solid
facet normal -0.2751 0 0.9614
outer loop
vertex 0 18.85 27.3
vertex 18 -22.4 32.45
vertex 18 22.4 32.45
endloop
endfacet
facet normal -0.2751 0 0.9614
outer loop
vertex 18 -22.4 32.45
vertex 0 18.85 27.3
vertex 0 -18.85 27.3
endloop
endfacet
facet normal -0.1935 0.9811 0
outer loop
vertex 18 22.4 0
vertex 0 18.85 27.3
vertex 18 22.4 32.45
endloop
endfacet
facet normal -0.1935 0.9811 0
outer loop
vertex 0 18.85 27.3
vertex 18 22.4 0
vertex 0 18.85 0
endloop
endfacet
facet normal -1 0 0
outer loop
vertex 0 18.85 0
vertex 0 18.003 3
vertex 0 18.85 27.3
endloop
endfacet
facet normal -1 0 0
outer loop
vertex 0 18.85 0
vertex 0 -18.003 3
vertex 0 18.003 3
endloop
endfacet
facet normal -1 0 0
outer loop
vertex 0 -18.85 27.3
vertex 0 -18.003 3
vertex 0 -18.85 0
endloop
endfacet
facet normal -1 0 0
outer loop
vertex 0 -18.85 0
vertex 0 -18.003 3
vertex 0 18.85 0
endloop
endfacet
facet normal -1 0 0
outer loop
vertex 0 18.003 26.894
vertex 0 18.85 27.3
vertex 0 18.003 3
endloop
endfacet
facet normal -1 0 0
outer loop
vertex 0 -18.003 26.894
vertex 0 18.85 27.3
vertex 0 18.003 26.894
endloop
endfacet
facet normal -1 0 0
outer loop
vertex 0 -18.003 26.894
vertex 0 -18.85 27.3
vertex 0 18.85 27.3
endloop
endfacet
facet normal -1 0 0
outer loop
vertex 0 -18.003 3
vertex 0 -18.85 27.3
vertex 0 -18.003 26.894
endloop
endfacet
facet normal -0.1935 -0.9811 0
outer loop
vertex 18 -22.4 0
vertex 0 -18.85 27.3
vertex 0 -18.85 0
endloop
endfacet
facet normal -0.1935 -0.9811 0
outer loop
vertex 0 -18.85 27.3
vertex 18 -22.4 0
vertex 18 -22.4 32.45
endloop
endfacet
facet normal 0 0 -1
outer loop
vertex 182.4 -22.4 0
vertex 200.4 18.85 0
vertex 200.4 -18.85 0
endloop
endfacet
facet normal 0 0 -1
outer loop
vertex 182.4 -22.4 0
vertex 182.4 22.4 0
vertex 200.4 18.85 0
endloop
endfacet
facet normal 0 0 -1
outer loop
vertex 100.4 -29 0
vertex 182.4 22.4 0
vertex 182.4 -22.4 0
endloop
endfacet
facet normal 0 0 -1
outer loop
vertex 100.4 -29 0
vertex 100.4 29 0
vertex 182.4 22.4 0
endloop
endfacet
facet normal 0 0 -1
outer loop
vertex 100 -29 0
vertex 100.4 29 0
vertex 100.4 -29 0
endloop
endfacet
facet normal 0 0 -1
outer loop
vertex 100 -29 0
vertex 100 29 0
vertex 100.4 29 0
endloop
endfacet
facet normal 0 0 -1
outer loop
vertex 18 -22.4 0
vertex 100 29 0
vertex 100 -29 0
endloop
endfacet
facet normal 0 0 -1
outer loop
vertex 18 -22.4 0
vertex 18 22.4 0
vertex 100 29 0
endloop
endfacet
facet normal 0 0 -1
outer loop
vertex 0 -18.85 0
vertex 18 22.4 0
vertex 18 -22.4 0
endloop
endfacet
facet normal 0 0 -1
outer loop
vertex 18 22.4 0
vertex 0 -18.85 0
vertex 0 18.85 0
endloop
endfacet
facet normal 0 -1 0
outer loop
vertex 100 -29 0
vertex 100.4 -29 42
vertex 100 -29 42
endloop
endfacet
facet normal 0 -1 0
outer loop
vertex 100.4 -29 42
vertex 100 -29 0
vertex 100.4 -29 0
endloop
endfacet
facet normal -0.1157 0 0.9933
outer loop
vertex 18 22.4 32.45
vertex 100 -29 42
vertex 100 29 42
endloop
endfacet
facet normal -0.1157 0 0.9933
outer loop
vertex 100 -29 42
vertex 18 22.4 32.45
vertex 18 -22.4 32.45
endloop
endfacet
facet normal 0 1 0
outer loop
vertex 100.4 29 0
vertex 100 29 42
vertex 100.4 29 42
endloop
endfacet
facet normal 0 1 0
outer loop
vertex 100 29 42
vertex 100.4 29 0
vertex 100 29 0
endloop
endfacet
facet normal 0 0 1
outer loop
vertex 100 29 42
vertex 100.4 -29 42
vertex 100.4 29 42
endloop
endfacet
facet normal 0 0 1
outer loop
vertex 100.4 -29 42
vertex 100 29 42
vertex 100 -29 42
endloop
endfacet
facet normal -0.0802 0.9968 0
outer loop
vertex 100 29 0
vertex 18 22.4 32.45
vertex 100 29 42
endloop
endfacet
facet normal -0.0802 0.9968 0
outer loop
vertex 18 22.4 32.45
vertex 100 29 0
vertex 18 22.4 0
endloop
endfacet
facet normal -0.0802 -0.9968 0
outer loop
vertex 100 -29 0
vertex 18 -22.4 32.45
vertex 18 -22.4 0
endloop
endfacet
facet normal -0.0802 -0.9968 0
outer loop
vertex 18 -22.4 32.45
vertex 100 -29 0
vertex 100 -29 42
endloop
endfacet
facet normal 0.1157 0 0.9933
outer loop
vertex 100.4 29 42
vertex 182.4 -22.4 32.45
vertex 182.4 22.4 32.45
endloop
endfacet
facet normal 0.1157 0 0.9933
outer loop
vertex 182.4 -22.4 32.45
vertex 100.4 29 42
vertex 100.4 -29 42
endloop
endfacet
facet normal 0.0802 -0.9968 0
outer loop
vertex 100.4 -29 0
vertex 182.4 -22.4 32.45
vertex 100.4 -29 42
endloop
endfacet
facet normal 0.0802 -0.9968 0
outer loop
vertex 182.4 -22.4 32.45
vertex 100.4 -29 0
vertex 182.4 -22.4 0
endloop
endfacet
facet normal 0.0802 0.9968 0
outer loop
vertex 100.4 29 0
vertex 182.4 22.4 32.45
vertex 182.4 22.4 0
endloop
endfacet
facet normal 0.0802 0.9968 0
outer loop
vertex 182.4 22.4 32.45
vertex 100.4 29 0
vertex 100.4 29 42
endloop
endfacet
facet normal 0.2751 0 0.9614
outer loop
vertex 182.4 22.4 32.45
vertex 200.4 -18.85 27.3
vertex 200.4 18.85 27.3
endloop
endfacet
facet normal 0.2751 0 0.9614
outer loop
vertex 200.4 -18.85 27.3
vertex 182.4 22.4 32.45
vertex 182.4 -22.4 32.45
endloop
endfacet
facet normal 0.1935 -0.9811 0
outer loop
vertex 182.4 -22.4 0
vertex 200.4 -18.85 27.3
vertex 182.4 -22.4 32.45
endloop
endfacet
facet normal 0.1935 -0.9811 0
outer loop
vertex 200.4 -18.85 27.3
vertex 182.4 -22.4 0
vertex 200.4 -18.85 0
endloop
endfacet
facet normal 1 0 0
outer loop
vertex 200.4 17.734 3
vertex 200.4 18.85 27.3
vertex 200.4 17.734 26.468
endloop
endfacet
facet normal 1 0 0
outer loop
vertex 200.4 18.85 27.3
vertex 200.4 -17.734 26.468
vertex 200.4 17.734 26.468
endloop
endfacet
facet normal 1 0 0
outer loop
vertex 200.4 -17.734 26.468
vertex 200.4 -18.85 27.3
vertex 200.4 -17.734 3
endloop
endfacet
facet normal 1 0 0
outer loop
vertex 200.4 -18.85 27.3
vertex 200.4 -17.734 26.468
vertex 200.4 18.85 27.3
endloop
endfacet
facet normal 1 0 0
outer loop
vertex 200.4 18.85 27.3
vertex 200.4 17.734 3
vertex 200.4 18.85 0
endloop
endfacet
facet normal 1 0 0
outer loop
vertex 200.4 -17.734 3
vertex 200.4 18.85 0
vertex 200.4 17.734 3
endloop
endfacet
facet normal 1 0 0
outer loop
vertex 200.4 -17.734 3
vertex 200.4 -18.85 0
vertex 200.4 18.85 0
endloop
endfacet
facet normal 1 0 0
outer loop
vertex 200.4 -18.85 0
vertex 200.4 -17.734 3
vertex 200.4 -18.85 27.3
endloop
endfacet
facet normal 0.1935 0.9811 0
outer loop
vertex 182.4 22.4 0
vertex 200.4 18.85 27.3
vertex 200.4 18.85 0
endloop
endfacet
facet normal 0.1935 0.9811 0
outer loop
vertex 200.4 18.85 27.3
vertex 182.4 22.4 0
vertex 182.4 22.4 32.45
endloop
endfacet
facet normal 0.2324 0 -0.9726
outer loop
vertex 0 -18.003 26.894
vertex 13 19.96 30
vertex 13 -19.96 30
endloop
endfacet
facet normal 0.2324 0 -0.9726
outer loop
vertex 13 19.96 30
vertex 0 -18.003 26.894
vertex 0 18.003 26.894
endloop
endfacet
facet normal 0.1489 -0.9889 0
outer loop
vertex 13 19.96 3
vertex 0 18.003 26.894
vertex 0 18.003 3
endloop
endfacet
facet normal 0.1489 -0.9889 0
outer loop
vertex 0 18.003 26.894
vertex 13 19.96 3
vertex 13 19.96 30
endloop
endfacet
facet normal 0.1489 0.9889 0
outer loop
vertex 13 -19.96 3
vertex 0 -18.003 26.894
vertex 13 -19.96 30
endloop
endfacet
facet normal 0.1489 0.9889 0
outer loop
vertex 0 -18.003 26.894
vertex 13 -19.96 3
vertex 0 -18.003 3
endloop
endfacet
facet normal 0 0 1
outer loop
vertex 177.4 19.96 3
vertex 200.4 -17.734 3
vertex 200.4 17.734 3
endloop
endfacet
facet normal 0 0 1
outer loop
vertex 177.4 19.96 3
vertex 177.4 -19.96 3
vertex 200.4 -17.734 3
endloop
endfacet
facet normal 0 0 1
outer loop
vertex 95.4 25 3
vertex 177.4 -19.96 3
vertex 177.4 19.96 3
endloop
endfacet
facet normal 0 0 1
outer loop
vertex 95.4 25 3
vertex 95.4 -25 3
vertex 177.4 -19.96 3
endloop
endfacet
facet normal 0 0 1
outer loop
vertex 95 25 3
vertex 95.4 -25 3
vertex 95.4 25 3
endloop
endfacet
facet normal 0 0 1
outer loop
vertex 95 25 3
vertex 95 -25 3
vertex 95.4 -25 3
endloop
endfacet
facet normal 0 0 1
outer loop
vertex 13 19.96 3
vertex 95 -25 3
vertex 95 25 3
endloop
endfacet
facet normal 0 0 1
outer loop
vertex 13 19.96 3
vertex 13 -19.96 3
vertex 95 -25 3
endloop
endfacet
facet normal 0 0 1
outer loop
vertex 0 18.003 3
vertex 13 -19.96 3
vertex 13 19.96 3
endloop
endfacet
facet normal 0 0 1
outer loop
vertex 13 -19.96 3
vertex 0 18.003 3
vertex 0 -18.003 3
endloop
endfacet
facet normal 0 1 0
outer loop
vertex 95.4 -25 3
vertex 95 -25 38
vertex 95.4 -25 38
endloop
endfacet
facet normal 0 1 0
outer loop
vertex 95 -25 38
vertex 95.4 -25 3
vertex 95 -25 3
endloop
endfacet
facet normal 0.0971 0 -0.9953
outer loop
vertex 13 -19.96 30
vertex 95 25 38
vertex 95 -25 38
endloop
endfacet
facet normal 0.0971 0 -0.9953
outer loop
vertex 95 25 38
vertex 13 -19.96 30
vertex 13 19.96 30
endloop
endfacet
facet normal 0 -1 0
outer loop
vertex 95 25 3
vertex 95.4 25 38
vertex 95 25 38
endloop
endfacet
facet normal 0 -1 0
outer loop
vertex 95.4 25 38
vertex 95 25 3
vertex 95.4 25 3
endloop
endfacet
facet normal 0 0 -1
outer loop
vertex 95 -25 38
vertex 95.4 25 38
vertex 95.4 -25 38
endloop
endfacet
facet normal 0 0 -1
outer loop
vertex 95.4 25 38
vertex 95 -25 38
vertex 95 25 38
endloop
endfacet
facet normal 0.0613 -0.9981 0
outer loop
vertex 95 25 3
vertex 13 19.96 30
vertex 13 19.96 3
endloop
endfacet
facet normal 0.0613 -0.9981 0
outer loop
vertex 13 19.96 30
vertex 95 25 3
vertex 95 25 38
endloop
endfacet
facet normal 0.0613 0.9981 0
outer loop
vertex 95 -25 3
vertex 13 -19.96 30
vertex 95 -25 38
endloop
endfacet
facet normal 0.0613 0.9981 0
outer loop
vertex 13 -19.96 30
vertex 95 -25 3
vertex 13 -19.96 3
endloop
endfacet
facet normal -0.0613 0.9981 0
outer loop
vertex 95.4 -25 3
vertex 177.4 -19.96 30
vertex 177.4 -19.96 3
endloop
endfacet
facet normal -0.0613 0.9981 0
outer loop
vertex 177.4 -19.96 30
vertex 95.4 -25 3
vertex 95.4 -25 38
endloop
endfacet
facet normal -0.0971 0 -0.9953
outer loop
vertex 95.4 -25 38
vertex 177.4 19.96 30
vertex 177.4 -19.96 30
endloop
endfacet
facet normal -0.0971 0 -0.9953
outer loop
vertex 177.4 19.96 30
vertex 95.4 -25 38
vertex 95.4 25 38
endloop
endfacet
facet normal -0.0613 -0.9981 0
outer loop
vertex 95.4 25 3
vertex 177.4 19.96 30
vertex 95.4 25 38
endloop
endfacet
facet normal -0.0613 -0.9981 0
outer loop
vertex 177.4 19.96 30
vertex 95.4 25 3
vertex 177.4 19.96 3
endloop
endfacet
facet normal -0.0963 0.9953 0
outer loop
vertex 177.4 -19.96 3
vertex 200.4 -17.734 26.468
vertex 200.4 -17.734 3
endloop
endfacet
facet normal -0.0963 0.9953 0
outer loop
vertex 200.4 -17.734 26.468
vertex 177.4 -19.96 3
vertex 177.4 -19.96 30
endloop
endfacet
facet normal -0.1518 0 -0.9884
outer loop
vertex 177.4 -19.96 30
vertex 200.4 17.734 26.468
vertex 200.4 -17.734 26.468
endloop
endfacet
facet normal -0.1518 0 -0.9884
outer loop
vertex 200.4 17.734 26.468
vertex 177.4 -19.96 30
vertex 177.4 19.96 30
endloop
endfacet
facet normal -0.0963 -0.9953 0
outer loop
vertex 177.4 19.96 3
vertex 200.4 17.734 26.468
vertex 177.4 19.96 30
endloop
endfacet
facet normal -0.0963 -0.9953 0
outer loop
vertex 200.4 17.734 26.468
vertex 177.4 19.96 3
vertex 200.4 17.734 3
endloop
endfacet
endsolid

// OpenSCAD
$fn = 32;

// ----------------------------------------------------------------------
// Faired channel: 200 x 58 x 42 mm, 4 mm walls, faired ends
// ----------------------------------------------------------------------

// --- parameters (mm) ---
length = 200;             // channel length
width = 58;               // channel width at mid length
height = 42;              // channel height at mid length
wall = 4;                 // side wall thickness
floor_t = 3;              // floor thickness
end_w = 37.7;             // faired end width
end_h = 27.3;             // faired end height

difference() {
  union() {
    hull() {
      translate([0, -18.85, 0]) cube([0.4, 37.7, 27.3]);
      translate([18, -22.4, 0]) cube([0.4, 44.8, 32.45]);
    }
    hull() {
      translate([18, -22.4, 0]) cube([0.4, 44.8, 32.45]);
      translate([100, -29, 0]) cube([0.4, 58, 42]);
    }
    hull() {
      translate([100, -29, 0]) cube([0.4, 58, 42]);
      translate([182, -22.4, 0]) cube([0.4, 44.8, 32.45]);
    }
    hull() {
      translate([182, -22.4, 0]) cube([0.4, 44.8, 32.45]);
      translate([200, -18.85, 0]) cube([0.4, 37.7, 27.3]);
    }
  }
  /* cavity, 5 mm proud of both ends so the ports are cut clean */
  hull() {
    translate([-5, -17.25, 3]) cube([0.4, 34.5, 22.7]);
    translate([13, -19.96, 3]) cube([0.4, 39.92, 27]);
  }
  hull() {
    translate([13, -19.96, 3]) cube([0.4, 39.92, 27]);
    translate([95, -25, 3]) cube([0.4, 50, 35]);
  }
  hull() {
    translate([95, -25, 3]) cube([0.4, 50, 35]);
    translate([177, -19.96, 3]) cube([0.4, 39.92, 27]);
  }
  hull() {
    translate([177, -19.96, 3]) cube([0.4, 39.92, 27]);
    translate([205, -17.25, 3]) cube([0.4, 34.5, 22.7]);
  }
}
